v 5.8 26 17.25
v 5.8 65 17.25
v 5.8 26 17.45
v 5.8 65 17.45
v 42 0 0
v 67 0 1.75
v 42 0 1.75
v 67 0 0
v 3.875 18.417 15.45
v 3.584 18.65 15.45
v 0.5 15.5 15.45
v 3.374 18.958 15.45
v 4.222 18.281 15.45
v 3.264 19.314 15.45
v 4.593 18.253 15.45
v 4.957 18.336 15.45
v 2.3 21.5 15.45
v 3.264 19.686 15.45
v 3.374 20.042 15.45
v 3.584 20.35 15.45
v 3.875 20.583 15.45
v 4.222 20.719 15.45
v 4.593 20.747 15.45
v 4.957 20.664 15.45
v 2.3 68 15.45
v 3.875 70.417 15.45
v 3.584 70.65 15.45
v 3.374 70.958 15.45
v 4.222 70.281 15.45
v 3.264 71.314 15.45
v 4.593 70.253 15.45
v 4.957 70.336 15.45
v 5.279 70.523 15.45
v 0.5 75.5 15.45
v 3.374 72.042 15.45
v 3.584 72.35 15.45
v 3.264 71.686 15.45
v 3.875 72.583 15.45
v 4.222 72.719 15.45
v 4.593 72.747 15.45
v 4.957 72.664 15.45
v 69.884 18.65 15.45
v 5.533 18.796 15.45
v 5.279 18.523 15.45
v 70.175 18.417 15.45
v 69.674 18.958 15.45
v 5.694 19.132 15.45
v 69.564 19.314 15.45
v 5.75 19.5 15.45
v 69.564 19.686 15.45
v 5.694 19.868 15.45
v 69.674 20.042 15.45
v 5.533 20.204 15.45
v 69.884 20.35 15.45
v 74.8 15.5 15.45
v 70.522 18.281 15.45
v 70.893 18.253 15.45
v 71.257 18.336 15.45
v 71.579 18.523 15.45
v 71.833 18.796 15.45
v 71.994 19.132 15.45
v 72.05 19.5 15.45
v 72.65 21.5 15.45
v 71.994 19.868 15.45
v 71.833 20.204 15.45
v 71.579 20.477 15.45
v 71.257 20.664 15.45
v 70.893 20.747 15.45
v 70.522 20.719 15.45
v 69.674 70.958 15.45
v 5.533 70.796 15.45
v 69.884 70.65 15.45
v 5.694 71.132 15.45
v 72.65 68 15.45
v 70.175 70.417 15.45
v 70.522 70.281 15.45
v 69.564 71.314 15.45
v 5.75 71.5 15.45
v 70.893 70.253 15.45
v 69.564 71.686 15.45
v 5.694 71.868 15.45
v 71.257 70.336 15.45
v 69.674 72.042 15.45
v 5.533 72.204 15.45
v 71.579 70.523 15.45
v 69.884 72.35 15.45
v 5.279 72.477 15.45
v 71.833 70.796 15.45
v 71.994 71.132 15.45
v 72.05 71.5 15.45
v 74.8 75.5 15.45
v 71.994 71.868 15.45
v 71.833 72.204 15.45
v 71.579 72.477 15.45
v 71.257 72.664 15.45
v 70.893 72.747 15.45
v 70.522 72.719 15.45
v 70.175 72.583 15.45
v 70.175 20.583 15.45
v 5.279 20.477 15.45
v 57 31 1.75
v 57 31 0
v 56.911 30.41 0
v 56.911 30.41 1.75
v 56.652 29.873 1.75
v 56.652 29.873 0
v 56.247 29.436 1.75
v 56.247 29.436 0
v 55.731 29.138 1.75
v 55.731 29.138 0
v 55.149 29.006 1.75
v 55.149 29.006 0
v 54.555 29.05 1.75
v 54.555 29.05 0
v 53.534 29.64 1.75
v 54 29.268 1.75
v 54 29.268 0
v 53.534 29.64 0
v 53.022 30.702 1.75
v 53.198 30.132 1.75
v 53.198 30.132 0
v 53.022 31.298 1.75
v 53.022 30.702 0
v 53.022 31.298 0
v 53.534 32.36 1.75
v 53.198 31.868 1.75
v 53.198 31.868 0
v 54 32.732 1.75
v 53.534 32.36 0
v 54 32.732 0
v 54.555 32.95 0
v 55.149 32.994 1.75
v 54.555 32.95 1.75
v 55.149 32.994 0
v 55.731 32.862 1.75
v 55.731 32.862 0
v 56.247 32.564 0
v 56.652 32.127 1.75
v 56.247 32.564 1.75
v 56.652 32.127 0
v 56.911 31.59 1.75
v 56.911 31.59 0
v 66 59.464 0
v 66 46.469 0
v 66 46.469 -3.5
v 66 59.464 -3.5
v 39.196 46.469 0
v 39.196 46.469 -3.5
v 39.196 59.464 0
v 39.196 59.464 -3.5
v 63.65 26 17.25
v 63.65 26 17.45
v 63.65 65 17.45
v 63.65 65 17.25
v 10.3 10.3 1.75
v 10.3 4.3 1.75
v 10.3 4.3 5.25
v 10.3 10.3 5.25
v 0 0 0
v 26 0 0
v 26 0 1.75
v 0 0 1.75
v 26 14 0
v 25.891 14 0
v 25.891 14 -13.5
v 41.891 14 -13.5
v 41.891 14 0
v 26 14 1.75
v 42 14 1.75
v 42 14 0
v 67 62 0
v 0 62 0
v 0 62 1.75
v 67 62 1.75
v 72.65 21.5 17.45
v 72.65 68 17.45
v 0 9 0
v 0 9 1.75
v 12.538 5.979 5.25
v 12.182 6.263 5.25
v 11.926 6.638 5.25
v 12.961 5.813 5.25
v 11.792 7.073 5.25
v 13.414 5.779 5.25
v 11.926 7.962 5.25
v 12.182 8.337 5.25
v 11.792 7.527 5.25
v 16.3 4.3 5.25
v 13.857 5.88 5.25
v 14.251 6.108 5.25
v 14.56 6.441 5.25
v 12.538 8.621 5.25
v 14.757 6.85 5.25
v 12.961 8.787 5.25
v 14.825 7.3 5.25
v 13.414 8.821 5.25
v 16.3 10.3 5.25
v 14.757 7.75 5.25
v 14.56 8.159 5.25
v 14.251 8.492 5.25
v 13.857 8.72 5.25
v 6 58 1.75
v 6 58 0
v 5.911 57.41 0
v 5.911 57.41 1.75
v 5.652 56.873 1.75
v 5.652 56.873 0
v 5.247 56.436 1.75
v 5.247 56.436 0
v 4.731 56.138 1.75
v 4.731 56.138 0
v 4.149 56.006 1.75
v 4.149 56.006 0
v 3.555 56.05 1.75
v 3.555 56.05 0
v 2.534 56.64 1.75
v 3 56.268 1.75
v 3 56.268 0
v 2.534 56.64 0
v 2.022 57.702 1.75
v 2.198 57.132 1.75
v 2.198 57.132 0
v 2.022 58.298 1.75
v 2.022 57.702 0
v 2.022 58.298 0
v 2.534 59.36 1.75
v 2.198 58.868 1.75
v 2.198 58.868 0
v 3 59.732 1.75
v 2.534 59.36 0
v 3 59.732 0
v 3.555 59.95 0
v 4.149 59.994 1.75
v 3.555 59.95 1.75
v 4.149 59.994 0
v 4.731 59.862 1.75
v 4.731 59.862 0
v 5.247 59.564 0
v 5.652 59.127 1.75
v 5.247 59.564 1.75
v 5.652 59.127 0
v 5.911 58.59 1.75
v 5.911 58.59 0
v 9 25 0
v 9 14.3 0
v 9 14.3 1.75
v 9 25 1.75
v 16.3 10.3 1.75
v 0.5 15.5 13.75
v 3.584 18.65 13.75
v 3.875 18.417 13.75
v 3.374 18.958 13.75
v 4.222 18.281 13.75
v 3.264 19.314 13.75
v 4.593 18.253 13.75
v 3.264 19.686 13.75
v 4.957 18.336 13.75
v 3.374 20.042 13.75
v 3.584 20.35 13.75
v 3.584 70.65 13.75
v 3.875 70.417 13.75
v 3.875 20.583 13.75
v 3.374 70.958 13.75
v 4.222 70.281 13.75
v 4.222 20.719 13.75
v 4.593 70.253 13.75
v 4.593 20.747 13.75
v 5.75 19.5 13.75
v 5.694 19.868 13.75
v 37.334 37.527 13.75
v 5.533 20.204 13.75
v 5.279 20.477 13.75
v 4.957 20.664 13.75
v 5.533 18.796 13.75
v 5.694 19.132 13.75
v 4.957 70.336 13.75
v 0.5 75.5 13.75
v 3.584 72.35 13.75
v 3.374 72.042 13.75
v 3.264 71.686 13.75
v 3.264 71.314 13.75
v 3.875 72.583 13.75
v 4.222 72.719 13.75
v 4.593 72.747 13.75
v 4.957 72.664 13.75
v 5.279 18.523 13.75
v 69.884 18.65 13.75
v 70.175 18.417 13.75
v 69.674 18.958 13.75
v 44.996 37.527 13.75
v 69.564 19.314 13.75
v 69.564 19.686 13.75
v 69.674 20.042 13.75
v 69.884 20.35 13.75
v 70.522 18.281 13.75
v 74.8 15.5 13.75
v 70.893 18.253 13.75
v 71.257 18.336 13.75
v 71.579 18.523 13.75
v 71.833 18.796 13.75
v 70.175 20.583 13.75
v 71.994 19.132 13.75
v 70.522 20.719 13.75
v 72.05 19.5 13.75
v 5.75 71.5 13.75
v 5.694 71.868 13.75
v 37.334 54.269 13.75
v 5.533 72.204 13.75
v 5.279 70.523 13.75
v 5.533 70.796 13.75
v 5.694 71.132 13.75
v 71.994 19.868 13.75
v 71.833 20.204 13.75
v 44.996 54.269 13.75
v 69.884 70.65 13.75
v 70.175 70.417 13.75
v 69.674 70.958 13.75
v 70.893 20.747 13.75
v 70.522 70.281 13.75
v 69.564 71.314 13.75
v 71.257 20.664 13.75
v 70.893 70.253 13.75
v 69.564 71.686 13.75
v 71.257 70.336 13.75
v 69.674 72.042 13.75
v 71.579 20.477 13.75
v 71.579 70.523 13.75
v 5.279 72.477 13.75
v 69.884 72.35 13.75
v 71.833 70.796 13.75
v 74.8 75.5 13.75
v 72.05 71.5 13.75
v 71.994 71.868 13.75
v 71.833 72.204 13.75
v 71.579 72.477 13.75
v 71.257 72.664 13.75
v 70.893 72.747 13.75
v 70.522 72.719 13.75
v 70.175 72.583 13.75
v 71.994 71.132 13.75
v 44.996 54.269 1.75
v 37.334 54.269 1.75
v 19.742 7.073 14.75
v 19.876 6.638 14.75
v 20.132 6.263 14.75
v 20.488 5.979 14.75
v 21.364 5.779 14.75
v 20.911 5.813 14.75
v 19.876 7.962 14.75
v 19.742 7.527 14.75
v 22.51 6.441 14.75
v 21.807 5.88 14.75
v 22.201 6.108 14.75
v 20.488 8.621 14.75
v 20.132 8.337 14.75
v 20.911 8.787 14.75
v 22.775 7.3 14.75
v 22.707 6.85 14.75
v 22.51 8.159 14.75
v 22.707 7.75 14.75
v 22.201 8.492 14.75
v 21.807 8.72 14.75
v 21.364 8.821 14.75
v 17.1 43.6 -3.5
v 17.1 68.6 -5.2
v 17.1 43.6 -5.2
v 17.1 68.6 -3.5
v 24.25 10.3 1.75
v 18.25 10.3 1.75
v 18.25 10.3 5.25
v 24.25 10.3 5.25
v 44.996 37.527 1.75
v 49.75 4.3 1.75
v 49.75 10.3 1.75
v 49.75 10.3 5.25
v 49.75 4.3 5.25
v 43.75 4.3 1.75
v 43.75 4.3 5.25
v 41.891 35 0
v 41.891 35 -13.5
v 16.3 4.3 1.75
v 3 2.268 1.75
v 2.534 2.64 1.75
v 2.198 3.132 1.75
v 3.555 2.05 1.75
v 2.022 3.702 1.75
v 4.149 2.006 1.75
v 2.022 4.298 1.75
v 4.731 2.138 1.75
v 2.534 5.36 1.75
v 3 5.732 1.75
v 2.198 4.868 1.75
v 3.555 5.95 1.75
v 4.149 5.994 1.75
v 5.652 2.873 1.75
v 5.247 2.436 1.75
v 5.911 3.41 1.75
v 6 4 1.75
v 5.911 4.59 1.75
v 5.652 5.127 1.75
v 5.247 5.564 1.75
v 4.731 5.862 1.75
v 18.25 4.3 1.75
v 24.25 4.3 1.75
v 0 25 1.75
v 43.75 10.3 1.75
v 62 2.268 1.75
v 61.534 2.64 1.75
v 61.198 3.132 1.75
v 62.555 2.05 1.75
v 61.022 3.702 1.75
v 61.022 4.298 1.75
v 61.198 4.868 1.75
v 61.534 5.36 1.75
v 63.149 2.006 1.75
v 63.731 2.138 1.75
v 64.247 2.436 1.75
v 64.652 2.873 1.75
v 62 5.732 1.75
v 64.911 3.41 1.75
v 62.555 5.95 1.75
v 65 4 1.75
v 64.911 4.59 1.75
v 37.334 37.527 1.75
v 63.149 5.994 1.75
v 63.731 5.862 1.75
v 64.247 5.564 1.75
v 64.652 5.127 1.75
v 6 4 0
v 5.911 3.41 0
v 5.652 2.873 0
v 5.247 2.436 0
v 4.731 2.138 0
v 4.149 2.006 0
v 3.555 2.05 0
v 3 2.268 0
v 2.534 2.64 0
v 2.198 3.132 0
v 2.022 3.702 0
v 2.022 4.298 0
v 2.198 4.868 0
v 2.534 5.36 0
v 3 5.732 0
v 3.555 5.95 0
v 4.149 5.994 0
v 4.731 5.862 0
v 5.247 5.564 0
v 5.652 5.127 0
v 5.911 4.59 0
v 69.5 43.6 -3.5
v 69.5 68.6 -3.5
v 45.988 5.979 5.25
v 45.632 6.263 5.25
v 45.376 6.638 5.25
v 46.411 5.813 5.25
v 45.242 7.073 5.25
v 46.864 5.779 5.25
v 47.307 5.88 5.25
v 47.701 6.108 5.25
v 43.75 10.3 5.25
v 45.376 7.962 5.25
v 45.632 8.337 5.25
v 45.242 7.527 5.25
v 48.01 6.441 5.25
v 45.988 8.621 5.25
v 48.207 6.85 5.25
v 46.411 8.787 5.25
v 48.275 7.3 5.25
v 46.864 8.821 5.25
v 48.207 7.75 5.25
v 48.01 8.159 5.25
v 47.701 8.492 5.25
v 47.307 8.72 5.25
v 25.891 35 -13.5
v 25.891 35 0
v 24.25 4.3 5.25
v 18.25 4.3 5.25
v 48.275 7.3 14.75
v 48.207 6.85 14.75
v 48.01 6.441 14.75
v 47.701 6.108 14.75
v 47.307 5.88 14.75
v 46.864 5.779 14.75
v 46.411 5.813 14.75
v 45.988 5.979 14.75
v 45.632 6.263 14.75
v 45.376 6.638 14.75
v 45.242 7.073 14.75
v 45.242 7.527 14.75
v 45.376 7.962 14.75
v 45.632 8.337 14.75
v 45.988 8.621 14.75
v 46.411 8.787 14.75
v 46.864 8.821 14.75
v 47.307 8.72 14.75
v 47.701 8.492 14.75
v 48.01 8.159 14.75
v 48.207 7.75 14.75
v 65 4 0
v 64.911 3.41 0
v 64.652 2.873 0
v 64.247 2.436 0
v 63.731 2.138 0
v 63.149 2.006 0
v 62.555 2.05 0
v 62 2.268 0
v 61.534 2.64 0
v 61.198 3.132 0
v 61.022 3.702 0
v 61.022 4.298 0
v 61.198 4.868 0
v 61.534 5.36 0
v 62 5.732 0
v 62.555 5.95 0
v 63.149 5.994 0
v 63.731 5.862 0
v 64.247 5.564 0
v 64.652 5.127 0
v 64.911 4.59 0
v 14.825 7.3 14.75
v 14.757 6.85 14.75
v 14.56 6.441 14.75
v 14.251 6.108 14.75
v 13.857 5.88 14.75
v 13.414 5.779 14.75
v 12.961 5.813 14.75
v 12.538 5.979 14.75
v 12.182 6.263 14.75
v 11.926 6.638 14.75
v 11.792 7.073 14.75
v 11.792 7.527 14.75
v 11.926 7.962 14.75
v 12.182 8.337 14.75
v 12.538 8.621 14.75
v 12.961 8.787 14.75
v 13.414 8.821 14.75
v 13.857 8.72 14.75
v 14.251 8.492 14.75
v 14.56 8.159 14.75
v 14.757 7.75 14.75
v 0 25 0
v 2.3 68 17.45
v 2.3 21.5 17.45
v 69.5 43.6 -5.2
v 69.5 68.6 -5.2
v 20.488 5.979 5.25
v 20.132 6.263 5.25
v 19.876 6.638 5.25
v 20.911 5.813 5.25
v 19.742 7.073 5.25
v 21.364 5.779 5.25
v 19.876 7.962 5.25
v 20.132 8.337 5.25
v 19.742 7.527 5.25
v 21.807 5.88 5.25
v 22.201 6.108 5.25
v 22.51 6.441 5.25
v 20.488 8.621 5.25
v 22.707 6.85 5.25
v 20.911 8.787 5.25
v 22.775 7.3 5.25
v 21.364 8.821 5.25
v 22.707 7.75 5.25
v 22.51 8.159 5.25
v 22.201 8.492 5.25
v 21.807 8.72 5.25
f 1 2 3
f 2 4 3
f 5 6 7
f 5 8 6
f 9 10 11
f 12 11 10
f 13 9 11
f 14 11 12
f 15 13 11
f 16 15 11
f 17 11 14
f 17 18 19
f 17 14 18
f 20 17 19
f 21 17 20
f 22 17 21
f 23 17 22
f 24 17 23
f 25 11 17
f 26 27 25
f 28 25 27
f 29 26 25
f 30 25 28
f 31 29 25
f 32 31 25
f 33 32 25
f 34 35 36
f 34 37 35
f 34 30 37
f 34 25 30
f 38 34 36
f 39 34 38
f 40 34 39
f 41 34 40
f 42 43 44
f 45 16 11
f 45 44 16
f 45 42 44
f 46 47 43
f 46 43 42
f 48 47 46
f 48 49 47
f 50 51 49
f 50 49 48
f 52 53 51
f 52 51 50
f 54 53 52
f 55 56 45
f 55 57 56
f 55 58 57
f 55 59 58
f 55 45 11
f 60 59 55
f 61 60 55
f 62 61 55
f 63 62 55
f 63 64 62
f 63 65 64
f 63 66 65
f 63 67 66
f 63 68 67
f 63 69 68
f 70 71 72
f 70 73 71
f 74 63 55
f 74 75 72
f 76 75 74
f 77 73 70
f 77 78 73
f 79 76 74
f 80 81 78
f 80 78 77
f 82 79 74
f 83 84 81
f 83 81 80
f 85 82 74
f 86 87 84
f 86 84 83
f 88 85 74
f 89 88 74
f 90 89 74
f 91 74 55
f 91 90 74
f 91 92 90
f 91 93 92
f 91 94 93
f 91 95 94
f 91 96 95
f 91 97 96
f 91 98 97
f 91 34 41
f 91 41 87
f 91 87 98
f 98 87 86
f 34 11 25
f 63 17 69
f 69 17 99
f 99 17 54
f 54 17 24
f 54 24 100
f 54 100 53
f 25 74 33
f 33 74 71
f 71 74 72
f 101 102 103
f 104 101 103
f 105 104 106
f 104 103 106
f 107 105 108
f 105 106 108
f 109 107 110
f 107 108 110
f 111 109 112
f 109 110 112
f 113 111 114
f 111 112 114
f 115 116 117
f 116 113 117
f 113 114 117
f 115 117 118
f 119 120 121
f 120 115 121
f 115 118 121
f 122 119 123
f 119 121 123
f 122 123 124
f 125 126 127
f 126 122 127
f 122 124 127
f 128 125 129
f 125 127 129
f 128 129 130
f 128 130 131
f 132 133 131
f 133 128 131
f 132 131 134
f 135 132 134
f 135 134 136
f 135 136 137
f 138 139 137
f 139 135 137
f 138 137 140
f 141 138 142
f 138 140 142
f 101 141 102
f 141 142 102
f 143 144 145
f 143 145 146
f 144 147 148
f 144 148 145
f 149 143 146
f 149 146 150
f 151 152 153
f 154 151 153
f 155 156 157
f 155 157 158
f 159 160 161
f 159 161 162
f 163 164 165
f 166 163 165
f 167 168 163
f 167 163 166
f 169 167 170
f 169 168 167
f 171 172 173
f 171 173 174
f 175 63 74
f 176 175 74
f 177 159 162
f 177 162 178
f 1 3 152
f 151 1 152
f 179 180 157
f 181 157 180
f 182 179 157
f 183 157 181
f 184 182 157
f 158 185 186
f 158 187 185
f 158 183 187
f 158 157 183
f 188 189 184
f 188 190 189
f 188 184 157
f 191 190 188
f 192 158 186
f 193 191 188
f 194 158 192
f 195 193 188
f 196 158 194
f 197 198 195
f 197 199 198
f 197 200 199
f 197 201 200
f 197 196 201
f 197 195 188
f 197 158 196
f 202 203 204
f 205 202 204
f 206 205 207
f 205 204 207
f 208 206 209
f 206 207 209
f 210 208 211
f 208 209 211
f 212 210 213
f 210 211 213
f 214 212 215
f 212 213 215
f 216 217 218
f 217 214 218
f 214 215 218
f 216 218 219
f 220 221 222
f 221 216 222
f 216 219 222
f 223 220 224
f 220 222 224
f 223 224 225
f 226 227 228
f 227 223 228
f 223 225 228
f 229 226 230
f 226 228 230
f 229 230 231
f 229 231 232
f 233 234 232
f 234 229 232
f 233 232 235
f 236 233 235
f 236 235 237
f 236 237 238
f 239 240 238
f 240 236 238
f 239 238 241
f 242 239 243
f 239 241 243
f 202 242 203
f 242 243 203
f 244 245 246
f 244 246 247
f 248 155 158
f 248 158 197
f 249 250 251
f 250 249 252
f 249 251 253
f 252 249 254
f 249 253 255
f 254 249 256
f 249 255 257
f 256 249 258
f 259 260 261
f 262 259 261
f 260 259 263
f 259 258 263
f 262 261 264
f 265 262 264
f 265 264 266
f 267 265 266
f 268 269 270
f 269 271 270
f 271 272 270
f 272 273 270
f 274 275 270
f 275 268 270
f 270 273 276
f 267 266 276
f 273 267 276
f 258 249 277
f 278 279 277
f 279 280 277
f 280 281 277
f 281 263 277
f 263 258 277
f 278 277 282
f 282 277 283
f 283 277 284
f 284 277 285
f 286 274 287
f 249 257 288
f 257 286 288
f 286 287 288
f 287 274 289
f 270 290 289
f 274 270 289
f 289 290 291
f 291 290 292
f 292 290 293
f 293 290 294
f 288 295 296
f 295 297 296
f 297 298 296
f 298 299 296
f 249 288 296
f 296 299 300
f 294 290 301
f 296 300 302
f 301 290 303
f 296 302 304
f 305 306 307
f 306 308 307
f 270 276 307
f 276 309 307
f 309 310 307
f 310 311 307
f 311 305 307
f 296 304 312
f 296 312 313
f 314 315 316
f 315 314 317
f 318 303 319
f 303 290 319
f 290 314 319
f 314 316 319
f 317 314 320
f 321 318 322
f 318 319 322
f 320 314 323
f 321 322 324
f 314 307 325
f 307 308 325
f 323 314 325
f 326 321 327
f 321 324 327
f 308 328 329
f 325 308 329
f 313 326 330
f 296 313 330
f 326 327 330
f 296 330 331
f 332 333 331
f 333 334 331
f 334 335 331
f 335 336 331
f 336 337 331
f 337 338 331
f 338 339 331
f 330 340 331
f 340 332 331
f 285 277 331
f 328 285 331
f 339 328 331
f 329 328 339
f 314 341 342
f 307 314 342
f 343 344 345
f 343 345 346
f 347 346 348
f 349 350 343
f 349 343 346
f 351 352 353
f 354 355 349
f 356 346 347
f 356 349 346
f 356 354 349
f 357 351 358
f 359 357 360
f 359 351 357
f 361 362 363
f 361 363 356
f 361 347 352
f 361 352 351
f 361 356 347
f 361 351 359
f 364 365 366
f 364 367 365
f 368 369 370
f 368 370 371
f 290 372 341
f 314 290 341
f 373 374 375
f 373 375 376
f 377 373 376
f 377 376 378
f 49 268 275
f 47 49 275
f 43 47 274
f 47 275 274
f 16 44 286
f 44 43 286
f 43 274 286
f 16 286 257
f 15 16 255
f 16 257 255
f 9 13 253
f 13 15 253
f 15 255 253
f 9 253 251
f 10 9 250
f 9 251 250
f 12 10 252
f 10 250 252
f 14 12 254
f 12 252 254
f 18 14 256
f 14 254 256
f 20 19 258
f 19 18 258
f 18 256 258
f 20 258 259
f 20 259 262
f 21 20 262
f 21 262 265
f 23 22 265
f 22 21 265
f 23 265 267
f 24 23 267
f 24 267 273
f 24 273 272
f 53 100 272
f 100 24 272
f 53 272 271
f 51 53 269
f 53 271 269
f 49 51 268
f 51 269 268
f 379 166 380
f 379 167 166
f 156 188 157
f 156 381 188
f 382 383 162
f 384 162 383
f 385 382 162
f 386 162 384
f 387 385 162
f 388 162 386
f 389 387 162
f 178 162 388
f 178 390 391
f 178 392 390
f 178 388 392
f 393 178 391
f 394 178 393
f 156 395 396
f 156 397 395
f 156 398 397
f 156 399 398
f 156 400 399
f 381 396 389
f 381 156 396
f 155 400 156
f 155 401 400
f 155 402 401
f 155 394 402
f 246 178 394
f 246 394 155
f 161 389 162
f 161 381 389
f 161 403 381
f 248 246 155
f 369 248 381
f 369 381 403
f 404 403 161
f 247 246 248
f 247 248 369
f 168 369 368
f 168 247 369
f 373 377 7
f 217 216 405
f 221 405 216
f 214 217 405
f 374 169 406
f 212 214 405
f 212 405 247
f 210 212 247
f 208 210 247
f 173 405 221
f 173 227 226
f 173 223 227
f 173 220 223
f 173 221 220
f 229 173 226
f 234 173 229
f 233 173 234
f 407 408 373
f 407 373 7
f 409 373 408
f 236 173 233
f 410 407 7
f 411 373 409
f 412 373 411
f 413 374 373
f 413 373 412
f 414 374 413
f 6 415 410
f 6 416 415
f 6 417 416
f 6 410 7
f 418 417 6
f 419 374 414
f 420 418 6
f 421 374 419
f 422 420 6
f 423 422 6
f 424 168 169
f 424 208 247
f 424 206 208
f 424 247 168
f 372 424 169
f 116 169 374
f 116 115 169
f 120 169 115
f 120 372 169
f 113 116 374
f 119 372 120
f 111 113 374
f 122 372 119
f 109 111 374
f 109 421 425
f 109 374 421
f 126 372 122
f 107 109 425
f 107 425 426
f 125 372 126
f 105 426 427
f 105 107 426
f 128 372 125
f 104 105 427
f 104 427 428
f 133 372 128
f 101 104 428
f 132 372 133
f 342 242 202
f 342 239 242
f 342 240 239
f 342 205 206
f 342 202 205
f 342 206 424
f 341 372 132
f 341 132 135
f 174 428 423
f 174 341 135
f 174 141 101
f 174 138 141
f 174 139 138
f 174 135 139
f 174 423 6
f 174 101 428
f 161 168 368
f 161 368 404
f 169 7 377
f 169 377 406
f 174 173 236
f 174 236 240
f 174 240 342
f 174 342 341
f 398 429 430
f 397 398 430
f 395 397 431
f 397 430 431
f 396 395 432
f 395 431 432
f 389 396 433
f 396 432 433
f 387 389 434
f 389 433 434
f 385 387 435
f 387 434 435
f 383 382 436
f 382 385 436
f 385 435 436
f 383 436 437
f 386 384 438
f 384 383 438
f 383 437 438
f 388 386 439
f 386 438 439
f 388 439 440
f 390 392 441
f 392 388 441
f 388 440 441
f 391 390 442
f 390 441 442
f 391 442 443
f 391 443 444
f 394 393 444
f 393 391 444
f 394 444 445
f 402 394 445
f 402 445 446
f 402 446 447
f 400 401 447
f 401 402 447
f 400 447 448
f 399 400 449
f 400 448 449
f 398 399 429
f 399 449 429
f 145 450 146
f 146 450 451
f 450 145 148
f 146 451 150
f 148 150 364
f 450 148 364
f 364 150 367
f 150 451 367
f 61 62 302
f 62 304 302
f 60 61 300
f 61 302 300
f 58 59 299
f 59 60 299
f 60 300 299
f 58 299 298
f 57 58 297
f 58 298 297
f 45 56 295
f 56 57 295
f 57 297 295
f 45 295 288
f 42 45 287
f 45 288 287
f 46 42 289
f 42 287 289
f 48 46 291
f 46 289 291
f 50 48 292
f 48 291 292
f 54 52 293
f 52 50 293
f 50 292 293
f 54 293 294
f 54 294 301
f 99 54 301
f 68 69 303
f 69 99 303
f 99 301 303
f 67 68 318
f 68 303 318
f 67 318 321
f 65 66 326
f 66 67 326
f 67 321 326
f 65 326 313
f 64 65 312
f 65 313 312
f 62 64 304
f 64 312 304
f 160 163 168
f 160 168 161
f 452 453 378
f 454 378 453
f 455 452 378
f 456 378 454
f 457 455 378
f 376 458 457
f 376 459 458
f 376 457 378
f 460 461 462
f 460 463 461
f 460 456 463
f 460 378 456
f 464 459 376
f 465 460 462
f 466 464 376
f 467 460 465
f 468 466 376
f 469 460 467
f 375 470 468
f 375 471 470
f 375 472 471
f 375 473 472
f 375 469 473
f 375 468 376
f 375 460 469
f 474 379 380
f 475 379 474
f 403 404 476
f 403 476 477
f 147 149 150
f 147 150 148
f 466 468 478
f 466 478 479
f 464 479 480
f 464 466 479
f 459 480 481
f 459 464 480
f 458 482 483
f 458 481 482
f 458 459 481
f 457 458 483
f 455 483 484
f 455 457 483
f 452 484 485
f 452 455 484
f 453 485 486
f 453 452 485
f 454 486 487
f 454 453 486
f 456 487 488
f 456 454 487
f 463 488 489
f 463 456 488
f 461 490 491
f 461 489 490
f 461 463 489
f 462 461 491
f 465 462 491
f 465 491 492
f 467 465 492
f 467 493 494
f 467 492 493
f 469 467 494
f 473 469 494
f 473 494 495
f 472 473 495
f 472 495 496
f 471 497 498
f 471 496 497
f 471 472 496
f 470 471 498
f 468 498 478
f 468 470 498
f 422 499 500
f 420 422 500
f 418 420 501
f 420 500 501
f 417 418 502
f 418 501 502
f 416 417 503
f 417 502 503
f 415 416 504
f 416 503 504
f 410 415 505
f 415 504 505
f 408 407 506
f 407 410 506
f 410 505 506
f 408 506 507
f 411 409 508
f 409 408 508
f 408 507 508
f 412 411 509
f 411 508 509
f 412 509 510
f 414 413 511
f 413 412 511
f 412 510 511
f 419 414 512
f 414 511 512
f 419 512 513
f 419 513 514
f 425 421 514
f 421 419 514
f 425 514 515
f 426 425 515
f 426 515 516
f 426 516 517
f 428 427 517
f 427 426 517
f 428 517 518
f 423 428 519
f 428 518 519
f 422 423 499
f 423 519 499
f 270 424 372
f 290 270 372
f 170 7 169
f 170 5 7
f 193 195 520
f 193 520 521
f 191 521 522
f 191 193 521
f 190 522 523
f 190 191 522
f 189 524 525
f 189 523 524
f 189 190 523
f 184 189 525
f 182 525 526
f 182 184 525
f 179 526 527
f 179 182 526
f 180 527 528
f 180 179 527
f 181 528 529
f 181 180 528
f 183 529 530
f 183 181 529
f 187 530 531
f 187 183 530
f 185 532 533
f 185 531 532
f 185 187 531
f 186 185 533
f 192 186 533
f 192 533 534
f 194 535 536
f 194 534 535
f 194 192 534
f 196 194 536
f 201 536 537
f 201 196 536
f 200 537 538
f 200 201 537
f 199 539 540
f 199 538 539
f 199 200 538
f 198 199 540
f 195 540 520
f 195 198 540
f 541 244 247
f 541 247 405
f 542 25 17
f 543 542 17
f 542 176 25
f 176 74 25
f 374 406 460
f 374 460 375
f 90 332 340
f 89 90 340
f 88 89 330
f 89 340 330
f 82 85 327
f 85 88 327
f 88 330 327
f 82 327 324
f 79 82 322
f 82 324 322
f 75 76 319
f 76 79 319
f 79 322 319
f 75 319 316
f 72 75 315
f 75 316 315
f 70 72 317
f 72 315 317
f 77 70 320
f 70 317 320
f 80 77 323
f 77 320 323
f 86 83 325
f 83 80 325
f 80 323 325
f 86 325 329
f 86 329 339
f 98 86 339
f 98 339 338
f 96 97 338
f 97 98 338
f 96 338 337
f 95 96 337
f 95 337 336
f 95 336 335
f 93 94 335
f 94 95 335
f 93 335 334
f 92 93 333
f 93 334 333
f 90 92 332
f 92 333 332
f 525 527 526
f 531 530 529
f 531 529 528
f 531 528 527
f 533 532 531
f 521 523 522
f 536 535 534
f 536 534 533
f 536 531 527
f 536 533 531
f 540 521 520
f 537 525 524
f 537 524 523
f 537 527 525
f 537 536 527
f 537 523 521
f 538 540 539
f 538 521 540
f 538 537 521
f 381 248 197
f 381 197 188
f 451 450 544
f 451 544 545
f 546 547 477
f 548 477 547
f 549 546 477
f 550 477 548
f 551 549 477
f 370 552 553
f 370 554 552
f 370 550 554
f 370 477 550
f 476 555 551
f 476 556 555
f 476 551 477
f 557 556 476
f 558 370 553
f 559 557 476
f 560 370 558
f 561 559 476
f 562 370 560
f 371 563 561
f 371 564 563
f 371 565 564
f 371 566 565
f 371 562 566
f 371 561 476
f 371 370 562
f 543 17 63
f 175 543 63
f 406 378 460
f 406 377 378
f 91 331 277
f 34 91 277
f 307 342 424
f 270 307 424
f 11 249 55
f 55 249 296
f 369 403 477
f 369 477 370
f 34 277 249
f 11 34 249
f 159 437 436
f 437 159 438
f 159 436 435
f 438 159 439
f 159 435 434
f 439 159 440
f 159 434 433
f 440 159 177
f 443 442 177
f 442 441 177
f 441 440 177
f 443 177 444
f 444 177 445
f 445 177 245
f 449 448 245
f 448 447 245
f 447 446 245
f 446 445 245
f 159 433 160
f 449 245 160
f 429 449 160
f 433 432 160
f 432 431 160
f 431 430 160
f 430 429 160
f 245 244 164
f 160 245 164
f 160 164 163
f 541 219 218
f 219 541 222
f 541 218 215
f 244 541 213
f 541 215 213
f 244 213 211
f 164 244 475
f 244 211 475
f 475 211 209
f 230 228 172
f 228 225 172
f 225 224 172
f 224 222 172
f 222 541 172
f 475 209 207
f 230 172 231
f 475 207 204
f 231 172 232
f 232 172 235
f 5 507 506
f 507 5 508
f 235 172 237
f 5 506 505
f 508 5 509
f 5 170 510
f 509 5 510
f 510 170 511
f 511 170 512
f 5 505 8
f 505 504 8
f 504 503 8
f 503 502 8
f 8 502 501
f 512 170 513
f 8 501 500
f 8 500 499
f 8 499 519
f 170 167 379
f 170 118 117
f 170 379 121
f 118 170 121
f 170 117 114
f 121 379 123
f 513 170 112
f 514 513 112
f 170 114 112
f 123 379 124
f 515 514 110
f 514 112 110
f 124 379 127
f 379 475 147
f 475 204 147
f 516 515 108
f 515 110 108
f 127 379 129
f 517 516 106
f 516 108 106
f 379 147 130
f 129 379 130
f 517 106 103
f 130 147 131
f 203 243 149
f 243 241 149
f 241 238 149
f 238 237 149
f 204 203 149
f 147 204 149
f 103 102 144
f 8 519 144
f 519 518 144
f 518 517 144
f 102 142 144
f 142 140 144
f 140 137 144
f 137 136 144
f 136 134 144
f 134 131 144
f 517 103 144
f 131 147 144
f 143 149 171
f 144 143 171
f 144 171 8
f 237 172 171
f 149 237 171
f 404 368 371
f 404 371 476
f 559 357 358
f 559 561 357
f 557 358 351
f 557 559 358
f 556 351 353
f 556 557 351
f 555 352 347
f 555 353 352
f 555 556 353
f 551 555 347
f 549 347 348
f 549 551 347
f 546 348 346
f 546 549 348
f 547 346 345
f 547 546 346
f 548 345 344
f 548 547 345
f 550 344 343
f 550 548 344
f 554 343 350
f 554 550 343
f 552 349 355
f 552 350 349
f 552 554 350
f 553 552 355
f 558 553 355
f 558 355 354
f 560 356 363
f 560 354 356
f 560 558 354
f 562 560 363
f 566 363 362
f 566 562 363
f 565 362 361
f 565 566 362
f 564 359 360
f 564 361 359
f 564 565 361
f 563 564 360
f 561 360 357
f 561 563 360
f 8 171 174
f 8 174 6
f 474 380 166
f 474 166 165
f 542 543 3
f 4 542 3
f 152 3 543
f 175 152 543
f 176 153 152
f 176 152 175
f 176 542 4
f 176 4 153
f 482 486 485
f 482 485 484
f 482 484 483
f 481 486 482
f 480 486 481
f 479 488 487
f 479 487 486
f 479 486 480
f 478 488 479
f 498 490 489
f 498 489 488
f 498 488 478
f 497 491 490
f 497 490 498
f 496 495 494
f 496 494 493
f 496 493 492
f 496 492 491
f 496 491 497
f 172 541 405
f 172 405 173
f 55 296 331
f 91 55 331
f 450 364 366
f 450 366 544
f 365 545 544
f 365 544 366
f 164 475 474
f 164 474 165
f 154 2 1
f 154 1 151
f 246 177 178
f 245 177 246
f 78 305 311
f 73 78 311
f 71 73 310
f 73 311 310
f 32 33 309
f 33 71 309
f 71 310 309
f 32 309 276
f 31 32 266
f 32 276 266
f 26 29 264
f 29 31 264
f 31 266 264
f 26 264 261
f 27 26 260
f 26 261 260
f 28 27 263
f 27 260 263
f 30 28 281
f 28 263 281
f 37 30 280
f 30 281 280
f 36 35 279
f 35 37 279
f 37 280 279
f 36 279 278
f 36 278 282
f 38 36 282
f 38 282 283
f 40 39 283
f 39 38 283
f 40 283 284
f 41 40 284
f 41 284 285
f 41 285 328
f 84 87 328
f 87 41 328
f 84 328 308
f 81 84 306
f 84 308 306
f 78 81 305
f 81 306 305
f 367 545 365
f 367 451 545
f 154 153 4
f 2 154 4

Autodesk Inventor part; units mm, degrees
ref_plane "YZ Plane" through (0, 0, 0) normal (1, 0, 0) x (0, 1, 0)
ref_plane "XZ Plane" through (0, 0, 0) normal (0, 1, 0) x (-1, 0, 0)
ref_plane "XY Plane" through (0, 0, 0) normal (0, 0, 1) x (1, 0, 0)
sketch "Umriss_Sensorplatine" plane through (0, 0, 0) normal (0, 0, 1) x (1, 0, 0)
  line L0 (0, 62) -> (67, 62)
  line L1 (67, 62) -> (67, 0)
  line L2 (67, 0) -> (42, 0)
  line L3 (42, 0) -> (42, 14)
  line L4 (42, 14) -> (26, 14)
  line L5 (26, 14) -> (26, 0)
  line L6 (26, 0) -> (0, 0)
  line L7 (9, 14.3) -> (9, 25)
  line L8 (9, 25) -> (0, 25)
  line L9 (0, 0) -> (0, 9)
  line L10 (0, 25) -> (0, 62)
  circle A0 centre (63, 4) radius 2
  circle A1 centre (4, 4) radius 2
  circle A2 centre (55, 31) radius 2
  circle A3 centre (4, 58) radius 2
  line L11 (4, 4) -> (63, 4) construction
  line L12 (4, 4) -> (4, 58) construction
  line L13 (0, 9) -> (9, 14.3)
  dimension "d0" = 4
  dimension "d2" = 4
  dimension "d3" = 4
  dimension "d4" = 4
  dimension "d5" = 67
  dimension "d6" = 26
  dimension "d7" = 42
  dimension "d8" = 14
  dimension "d9" = 4
  dimension "d11" = 25
  dimension "d12" = 9
  dimension "d13" = 62
  dimension "d14" = 31
  dimension "d15" = 55
  dimension "d67" = 14.3
  dimension "d68" = 9
extrude "Sensorplatine" add sketch "Umriss_Sensorplatine" along normal blind 1.75
sketch "Tasterprojektion" plane through (0, 0, 1.75) normal (0, 0, 1) x (1, 0, 0)
  line L0 (0, 0) -> (26, 0) construction
  line L1 (26, 0) -> (26, 14) construction
  line L2 (26, 14) -> (42, 14) construction
  line L3 (42, 14) -> (42, 0) construction
  line L4 (42, 0) -> (67, 0) construction
  line L5 (67, 0) -> (67, 62) construction
  line L6 (67, 62) -> (0, 62) construction
  line L7 (0, 62) -> (0, 25) construction
  line L8 (0, 9) -> (0, 0) construction
  line L9 (0, 7.3) -> (67, 7.3) construction
  circle A0 centre (13.3, 7.3) radius 1.525
  circle A1 centre (21.25, 7.3) radius 1.525
  circle A2 centre (46.75, 7.3) radius 1.525
  line L10 (43.75, 10.3) -> (49.75, 10.3)
  line L11 (49.75, 10.3) -> (49.75, 4.3)
  line L12 (49.75, 4.3) -> (43.75, 4.3)
  line L13 (43.75, 4.3) -> (43.75, 10.3)
  line L14 (43.75, 10.3) -> (49.75, 4.3) construction
  line L15 (49.75, 10.3) -> (43.75, 4.3) construction
  line L16 (18.25, 10.3) -> (24.25, 10.3)
  line L17 (24.25, 10.3) -> (24.25, 4.3)
  line L18 (24.25, 4.3) -> (18.25, 4.3)
  line L19 (18.25, 4.3) -> (18.25, 10.3)
  line L20 (18.25, 10.3) -> (24.25, 4.3) construction
  line L21 (24.25, 10.3) -> (18.25, 4.3) construction
  line L22 (10.3, 10.3) -> (16.3, 10.3)
  line L23 (16.3, 10.3) -> (16.3, 4.3)
  line L24 (16.3, 4.3) -> (10.3, 4.3)
  line L25 (10.3, 4.3) -> (10.3, 10.3)
  line L26 (10.3, 10.3) -> (16.3, 4.3) construction
  line L27 (16.3, 10.3) -> (10.3, 4.3) construction
  dimension "d19" = 7.3
  dimension "d20" = 3.05
  dimension "d21" = 13.3
  dimension "d22" = 21.25
  dimension "d23" = 46.75
  dimension "d24" = 6
  dimension "d25" = 6
extrude "Grundkoerper Taster" add sketch "Tasterprojektion" along normal blind 3.5
extrude "Nubsis Taster" add sketch "Tasterprojektion" along normal blind 13 contours A0 | A1 | A2
sketch "Sketch3" plane through (0, 0, 1.75) normal (0, 0, 1) x (1, 0, 0)
  line L0 (37.3343, 37.5267) -> (44.9961, 37.5267)
  line L1 (44.9961, 37.5267) -> (44.9961, 54.2692)
  line L2 (44.9961, 54.2692) -> (37.3343, 54.2692)
  line L3 (37.3343, 54.2692) -> (37.3343, 37.5267)
  line L4 (37.3343, 37.5267) -> (44.9961, 54.2692) construction
  line L5 (44.9961, 37.5267) -> (37.3343, 54.2692) construction
  point P0 (41.1652, 45.898)
extrude "Steckverbinder" add sketch "Sketch3" along normal blind 12
sketch "Sketch4" plane through (0, 0, 13.75) normal (0, 0, 1) x (1, 0, 0)
  line L0 (0, 62) -> (0, 25) construction
  line L1 (0, 25) -> (9, 25) construction
  line L2 (37.3343, 37.5267) -> (37.3343, 54.2692) construction
  line L3 (37.3343, 54.2692) -> (44.9961, 54.2692) construction
  line L4 (44.9961, 54.2692) -> (44.9961, 37.5267) construction
  line L5 (44.9961, 37.5267) -> (37.3343, 37.5267) construction
  line L6 (0, 0) -> (26, 0) construction
  line L7 (26, 0) -> (26, 14) construction
  line L8 (26, 14) -> (42, 14) construction
  line L9 (42, 14) -> (42, 0) construction
  line L10 (42, 0) -> (67, 0) construction
  line L11 (67, 0) -> (67, 62) construction
  line L12 (67, 62) -> (0, 62) construction
  line L13 (0, 62) -> (0, 25) construction
  line L14 (0, 25) -> (9, 25) construction
  line L15 (9, 25) -> (9, 14.3) construction
  line L16 (0, 9) -> (0, 0) construction
  circle A0 centre (63, 4) radius 2 construction
  circle A1 centre (4, 4) radius 2 construction
  circle A2 centre (55, 31) radius 2 construction
  circle A3 centre (4, 58) radius 2 construction
  line L17 (24.25, 10.3) -> (24.25, 4.3) construction
  line L18 (24.25, 4.3) -> (18.25, 4.3) construction
  line L19 (18.25, 4.3) -> (18.25, 10.3) construction
  line L20 (18.25, 10.3) -> (24.25, 10.3) construction
  line L21 (49.75, 10.3) -> (49.75, 4.3) construction
  line L22 (49.75, 4.3) -> (43.75, 4.3) construction
  line L23 (43.75, 4.3) -> (43.75, 10.3) construction
  line L24 (43.75, 10.3) -> (49.75, 10.3) construction
  line L25 (16.3, 10.3) -> (16.3, 4.3) construction
  line L26 (16.3, 4.3) -> (10.3, 4.3) construction
  line L27 (10.3, 4.3) -> (10.3, 10.3) construction
  line L28 (10.3, 10.3) -> (16.3, 10.3) construction
  line L29 (0.5, 15.5) -> (74.8, 15.5)
  line L30 (74.8, 15.5) -> (74.8, 75.5)
  line L31 (74.8, 75.5) -> (0.5, 75.5)
  line L32 (0.5, 75.5) -> (0.5, 15.5)
  line L33 (4.5, 19.5) -> (70.8, 19.5) construction
  line L34 (70.8, 19.5) -> (70.8, 71.5) construction
  line L35 (70.8, 71.5) -> (4.5, 71.5) construction
  line L36 (4.5, 71.5) -> (4.5, 19.5) construction
  circle A4 centre (70.8, 71.5) radius 1.25
  circle A5 centre (4.5, 71.5) radius 1.25
  circle A6 centre (4.5, 19.5) radius 1.25
  circle A7 centre (70.8, 19.5) radius 1.25
  line L37 (9, 14.3) -> (0, 9) projected
  dimension "d32" = 0.5
  dimension "d33" = 74.3
  dimension "d34" = 60
  dimension "d35" = 4
  dimension "d36" = 4
  dimension "d37" = 4
  dimension "d38" = 4
  dimension "d39" = 2.5
  dimension "d70" = 13.5
  dimension "d71" = 66.3
  dimension "d72" = 52
  dimension "d73" = 62
extrude "Grundplatine Display" add sketch "Sketch4" along normal blind 1.7
sketch "Sketch5" plane through (0, 0, 15.45) normal (0, 0, 1) x (1, 0, 0)
  line L0 (0.5, 15.5) -> (74.8, 15.5) projected
  line L1 (74.8, 15.5) -> (74.8, 75.5) projected
  line L2 (0.5, 75.5) -> (0.5, 15.5) projected
  circle A0 centre (70.8, 19.5) radius 1.25 construction
  circle A1 centre (4.5, 19.5) radius 1.25 construction
  circle A2 centre (4.5, 71.5) radius 1.25 construction
  circle A3 centre (70.8, 71.5) radius 1.25 construction
  line L3 (0.5, 15.5) -> (74.8, 15.5) construction
  line L4 (74.8, 15.5) -> (74.8, 75.5) construction
  line L5 (74.8, 75.5) -> (0.5, 75.5) construction
  line L6 (0.5, 75.5) -> (0.5, 15.5) construction
  line L7 (2.3, 21.5) -> (72.65, 21.5)
  line L8 (72.65, 21.5) -> (72.65, 68)
  line L9 (72.65, 68) -> (2.3, 68)
  line L10 (2.3, 68) -> (2.3, 21.5)
  point P0 (0, 0)
  dimension "d42" = 6
  dimension "d43" = 7.5
  dimension "d44" = 2.15
  dimension "d45" = 1.8
extrude "Glaskoerper Display" add sketch "Sketch5" along normal blind 2
sketch "Display" plane through (0, 0, 17.45) normal (0, 0, 1) x (1, 0, 0)
  line L0 (2.3, 21.5) -> (72.65, 21.5) construction
  line L1 (72.65, 21.5) -> (72.65, 68) construction
  line L2 (72.65, 68) -> (2.3, 68) construction
  line L3 (2.3, 68) -> (2.3, 21.5) construction
  line L4 (5.8, 26) -> (63.65, 26)
  line L5 (63.65, 26) -> (63.65, 65)
  line L6 (63.65, 65) -> (5.8, 65)
  line L7 (5.8, 65) -> (5.8, 26)
  line L8 (11.3777, 48.5369) -> (83.2025, 48.5369) construction
  line L9 (83.2025, 48.5369) -> (83.2025, 36.2483) construction
  line L10 (83.2025, 36.2483) -> (11.3777, 36.2483) construction
  line L11 (11.3777, 36.2483) -> (11.3777, 48.5369) construction
  point P0 (0, 0)
  dimension "d48" = 4.5
  dimension "d49" = 3
  dimension "d50" = 9
  dimension "d51" = 3.5
extrude "Bildausschnitt" cut sketch "Display" against normal blind 0.2
sketch "Sketch7" plane through (0, 0, 0) normal (0, 0, -1) x (-1, 0, 0)
  line L0 (-66, 59.4637) -> (-39.1956, 59.4637)
  line L1 (-39.1956, 59.4637) -> (-39.1956, 46.4689)
  line L2 (-39.1956, 46.4689) -> (-66, 46.4689)
  line L3 (-66, 46.4689) -> (-66, 59.4637)
extrude "Platzhalter_Stiftleiste" add sketch "Sketch7" along normal blind 3.5
sketch "Sketch8" plane through (0, 0, -3.5) normal (0, 0, -1) x (-1, 0, 0)
  line L0 (-39.1956, 59.4637) -> (-39.1956, 46.4689) construction
  line L1 (-39.1956, 46.4689) -> (-66, 46.4689) construction
  line L2 (-66, 46.4689) -> (-66, 59.4637) construction
  line L3 (-66, 59.4637) -> (-39.1956, 59.4637) construction
  circle A0 centre (-4, 58) radius 2 construction
  circle A1 centre (-55, 31) radius 2 construction
  circle A2 centre (-4, 4) radius 2 construction
  circle A3 centre (-63, 4) radius 2 construction
  line L4 (0, 0) -> (-26, 0) construction
  line L5 (0, 9) -> (0, 0) construction
  line L6 (-9, 25) -> (-9, 14.3) construction
  line L7 (0, 25) -> (-9, 25) construction
  line L8 (0, 62) -> (0, 25) construction
  line L9 (-67, 62) -> (0, 62) construction
  line L10 (-67, 0) -> (-67, 62) construction
  line L11 (-42, 0) -> (-67, 0) construction
  line L12 (-42, 14) -> (-42, 0) construction
  line L13 (-26, 14) -> (-42, 14) construction
  line L14 (-26, 0) -> (-26, 14) construction
  line L15 (-69.5, 68.6) -> (-17.1, 68.6)
  line L16 (-17.1, 68.6) -> (-17.1, 43.6)
  line L17 (-17.1, 43.6) -> (-69.5, 43.6)
  line L18 (-69.5, 43.6) -> (-69.5, 68.6)
  line L19 (-9, 14.3) -> (0, 9) projected
  dimension "d56" = 6.6
  dimension "d57" = 2.5
  dimension "d58" = 25
  dimension "d59" = 52.4
extrude "HexaHorst" add sketch "Sketch8" along normal blind 1.7
sketch "Sketch9" plane through (0, 0, 0) normal (0, 0, -1) x (-1, 0, 0)
  line L0 (-67, 62) -> (0, 62) projected
  line L1 (-26, 14) -> (-42, 14) projected
  line L2 (-34, 14) -> (-33.5, 62) construction
  line L3 (-41.8906, 35) -> (-25.8906, 35)
  line L4 (-25.8906, 35) -> (-25.8906, 14)
  line L5 (-25.8906, 14) -> (-41.8906, 14)
  line L6 (-41.8906, 14) -> (-41.8906, 35)
  line L7 (-41.8906, 35) -> (-25.8906, 14) construction
  line L8 (-25.8906, 35) -> (-41.8906, 14) construction
  point P0 (-33.8906, 24.5)
  dimension "d62" = 16
  dimension "d63" = 21
extrude "Extrusion10" add sketch "Sketch9" along normal blind 13.5
properties part number "Mockup_Platinen"
